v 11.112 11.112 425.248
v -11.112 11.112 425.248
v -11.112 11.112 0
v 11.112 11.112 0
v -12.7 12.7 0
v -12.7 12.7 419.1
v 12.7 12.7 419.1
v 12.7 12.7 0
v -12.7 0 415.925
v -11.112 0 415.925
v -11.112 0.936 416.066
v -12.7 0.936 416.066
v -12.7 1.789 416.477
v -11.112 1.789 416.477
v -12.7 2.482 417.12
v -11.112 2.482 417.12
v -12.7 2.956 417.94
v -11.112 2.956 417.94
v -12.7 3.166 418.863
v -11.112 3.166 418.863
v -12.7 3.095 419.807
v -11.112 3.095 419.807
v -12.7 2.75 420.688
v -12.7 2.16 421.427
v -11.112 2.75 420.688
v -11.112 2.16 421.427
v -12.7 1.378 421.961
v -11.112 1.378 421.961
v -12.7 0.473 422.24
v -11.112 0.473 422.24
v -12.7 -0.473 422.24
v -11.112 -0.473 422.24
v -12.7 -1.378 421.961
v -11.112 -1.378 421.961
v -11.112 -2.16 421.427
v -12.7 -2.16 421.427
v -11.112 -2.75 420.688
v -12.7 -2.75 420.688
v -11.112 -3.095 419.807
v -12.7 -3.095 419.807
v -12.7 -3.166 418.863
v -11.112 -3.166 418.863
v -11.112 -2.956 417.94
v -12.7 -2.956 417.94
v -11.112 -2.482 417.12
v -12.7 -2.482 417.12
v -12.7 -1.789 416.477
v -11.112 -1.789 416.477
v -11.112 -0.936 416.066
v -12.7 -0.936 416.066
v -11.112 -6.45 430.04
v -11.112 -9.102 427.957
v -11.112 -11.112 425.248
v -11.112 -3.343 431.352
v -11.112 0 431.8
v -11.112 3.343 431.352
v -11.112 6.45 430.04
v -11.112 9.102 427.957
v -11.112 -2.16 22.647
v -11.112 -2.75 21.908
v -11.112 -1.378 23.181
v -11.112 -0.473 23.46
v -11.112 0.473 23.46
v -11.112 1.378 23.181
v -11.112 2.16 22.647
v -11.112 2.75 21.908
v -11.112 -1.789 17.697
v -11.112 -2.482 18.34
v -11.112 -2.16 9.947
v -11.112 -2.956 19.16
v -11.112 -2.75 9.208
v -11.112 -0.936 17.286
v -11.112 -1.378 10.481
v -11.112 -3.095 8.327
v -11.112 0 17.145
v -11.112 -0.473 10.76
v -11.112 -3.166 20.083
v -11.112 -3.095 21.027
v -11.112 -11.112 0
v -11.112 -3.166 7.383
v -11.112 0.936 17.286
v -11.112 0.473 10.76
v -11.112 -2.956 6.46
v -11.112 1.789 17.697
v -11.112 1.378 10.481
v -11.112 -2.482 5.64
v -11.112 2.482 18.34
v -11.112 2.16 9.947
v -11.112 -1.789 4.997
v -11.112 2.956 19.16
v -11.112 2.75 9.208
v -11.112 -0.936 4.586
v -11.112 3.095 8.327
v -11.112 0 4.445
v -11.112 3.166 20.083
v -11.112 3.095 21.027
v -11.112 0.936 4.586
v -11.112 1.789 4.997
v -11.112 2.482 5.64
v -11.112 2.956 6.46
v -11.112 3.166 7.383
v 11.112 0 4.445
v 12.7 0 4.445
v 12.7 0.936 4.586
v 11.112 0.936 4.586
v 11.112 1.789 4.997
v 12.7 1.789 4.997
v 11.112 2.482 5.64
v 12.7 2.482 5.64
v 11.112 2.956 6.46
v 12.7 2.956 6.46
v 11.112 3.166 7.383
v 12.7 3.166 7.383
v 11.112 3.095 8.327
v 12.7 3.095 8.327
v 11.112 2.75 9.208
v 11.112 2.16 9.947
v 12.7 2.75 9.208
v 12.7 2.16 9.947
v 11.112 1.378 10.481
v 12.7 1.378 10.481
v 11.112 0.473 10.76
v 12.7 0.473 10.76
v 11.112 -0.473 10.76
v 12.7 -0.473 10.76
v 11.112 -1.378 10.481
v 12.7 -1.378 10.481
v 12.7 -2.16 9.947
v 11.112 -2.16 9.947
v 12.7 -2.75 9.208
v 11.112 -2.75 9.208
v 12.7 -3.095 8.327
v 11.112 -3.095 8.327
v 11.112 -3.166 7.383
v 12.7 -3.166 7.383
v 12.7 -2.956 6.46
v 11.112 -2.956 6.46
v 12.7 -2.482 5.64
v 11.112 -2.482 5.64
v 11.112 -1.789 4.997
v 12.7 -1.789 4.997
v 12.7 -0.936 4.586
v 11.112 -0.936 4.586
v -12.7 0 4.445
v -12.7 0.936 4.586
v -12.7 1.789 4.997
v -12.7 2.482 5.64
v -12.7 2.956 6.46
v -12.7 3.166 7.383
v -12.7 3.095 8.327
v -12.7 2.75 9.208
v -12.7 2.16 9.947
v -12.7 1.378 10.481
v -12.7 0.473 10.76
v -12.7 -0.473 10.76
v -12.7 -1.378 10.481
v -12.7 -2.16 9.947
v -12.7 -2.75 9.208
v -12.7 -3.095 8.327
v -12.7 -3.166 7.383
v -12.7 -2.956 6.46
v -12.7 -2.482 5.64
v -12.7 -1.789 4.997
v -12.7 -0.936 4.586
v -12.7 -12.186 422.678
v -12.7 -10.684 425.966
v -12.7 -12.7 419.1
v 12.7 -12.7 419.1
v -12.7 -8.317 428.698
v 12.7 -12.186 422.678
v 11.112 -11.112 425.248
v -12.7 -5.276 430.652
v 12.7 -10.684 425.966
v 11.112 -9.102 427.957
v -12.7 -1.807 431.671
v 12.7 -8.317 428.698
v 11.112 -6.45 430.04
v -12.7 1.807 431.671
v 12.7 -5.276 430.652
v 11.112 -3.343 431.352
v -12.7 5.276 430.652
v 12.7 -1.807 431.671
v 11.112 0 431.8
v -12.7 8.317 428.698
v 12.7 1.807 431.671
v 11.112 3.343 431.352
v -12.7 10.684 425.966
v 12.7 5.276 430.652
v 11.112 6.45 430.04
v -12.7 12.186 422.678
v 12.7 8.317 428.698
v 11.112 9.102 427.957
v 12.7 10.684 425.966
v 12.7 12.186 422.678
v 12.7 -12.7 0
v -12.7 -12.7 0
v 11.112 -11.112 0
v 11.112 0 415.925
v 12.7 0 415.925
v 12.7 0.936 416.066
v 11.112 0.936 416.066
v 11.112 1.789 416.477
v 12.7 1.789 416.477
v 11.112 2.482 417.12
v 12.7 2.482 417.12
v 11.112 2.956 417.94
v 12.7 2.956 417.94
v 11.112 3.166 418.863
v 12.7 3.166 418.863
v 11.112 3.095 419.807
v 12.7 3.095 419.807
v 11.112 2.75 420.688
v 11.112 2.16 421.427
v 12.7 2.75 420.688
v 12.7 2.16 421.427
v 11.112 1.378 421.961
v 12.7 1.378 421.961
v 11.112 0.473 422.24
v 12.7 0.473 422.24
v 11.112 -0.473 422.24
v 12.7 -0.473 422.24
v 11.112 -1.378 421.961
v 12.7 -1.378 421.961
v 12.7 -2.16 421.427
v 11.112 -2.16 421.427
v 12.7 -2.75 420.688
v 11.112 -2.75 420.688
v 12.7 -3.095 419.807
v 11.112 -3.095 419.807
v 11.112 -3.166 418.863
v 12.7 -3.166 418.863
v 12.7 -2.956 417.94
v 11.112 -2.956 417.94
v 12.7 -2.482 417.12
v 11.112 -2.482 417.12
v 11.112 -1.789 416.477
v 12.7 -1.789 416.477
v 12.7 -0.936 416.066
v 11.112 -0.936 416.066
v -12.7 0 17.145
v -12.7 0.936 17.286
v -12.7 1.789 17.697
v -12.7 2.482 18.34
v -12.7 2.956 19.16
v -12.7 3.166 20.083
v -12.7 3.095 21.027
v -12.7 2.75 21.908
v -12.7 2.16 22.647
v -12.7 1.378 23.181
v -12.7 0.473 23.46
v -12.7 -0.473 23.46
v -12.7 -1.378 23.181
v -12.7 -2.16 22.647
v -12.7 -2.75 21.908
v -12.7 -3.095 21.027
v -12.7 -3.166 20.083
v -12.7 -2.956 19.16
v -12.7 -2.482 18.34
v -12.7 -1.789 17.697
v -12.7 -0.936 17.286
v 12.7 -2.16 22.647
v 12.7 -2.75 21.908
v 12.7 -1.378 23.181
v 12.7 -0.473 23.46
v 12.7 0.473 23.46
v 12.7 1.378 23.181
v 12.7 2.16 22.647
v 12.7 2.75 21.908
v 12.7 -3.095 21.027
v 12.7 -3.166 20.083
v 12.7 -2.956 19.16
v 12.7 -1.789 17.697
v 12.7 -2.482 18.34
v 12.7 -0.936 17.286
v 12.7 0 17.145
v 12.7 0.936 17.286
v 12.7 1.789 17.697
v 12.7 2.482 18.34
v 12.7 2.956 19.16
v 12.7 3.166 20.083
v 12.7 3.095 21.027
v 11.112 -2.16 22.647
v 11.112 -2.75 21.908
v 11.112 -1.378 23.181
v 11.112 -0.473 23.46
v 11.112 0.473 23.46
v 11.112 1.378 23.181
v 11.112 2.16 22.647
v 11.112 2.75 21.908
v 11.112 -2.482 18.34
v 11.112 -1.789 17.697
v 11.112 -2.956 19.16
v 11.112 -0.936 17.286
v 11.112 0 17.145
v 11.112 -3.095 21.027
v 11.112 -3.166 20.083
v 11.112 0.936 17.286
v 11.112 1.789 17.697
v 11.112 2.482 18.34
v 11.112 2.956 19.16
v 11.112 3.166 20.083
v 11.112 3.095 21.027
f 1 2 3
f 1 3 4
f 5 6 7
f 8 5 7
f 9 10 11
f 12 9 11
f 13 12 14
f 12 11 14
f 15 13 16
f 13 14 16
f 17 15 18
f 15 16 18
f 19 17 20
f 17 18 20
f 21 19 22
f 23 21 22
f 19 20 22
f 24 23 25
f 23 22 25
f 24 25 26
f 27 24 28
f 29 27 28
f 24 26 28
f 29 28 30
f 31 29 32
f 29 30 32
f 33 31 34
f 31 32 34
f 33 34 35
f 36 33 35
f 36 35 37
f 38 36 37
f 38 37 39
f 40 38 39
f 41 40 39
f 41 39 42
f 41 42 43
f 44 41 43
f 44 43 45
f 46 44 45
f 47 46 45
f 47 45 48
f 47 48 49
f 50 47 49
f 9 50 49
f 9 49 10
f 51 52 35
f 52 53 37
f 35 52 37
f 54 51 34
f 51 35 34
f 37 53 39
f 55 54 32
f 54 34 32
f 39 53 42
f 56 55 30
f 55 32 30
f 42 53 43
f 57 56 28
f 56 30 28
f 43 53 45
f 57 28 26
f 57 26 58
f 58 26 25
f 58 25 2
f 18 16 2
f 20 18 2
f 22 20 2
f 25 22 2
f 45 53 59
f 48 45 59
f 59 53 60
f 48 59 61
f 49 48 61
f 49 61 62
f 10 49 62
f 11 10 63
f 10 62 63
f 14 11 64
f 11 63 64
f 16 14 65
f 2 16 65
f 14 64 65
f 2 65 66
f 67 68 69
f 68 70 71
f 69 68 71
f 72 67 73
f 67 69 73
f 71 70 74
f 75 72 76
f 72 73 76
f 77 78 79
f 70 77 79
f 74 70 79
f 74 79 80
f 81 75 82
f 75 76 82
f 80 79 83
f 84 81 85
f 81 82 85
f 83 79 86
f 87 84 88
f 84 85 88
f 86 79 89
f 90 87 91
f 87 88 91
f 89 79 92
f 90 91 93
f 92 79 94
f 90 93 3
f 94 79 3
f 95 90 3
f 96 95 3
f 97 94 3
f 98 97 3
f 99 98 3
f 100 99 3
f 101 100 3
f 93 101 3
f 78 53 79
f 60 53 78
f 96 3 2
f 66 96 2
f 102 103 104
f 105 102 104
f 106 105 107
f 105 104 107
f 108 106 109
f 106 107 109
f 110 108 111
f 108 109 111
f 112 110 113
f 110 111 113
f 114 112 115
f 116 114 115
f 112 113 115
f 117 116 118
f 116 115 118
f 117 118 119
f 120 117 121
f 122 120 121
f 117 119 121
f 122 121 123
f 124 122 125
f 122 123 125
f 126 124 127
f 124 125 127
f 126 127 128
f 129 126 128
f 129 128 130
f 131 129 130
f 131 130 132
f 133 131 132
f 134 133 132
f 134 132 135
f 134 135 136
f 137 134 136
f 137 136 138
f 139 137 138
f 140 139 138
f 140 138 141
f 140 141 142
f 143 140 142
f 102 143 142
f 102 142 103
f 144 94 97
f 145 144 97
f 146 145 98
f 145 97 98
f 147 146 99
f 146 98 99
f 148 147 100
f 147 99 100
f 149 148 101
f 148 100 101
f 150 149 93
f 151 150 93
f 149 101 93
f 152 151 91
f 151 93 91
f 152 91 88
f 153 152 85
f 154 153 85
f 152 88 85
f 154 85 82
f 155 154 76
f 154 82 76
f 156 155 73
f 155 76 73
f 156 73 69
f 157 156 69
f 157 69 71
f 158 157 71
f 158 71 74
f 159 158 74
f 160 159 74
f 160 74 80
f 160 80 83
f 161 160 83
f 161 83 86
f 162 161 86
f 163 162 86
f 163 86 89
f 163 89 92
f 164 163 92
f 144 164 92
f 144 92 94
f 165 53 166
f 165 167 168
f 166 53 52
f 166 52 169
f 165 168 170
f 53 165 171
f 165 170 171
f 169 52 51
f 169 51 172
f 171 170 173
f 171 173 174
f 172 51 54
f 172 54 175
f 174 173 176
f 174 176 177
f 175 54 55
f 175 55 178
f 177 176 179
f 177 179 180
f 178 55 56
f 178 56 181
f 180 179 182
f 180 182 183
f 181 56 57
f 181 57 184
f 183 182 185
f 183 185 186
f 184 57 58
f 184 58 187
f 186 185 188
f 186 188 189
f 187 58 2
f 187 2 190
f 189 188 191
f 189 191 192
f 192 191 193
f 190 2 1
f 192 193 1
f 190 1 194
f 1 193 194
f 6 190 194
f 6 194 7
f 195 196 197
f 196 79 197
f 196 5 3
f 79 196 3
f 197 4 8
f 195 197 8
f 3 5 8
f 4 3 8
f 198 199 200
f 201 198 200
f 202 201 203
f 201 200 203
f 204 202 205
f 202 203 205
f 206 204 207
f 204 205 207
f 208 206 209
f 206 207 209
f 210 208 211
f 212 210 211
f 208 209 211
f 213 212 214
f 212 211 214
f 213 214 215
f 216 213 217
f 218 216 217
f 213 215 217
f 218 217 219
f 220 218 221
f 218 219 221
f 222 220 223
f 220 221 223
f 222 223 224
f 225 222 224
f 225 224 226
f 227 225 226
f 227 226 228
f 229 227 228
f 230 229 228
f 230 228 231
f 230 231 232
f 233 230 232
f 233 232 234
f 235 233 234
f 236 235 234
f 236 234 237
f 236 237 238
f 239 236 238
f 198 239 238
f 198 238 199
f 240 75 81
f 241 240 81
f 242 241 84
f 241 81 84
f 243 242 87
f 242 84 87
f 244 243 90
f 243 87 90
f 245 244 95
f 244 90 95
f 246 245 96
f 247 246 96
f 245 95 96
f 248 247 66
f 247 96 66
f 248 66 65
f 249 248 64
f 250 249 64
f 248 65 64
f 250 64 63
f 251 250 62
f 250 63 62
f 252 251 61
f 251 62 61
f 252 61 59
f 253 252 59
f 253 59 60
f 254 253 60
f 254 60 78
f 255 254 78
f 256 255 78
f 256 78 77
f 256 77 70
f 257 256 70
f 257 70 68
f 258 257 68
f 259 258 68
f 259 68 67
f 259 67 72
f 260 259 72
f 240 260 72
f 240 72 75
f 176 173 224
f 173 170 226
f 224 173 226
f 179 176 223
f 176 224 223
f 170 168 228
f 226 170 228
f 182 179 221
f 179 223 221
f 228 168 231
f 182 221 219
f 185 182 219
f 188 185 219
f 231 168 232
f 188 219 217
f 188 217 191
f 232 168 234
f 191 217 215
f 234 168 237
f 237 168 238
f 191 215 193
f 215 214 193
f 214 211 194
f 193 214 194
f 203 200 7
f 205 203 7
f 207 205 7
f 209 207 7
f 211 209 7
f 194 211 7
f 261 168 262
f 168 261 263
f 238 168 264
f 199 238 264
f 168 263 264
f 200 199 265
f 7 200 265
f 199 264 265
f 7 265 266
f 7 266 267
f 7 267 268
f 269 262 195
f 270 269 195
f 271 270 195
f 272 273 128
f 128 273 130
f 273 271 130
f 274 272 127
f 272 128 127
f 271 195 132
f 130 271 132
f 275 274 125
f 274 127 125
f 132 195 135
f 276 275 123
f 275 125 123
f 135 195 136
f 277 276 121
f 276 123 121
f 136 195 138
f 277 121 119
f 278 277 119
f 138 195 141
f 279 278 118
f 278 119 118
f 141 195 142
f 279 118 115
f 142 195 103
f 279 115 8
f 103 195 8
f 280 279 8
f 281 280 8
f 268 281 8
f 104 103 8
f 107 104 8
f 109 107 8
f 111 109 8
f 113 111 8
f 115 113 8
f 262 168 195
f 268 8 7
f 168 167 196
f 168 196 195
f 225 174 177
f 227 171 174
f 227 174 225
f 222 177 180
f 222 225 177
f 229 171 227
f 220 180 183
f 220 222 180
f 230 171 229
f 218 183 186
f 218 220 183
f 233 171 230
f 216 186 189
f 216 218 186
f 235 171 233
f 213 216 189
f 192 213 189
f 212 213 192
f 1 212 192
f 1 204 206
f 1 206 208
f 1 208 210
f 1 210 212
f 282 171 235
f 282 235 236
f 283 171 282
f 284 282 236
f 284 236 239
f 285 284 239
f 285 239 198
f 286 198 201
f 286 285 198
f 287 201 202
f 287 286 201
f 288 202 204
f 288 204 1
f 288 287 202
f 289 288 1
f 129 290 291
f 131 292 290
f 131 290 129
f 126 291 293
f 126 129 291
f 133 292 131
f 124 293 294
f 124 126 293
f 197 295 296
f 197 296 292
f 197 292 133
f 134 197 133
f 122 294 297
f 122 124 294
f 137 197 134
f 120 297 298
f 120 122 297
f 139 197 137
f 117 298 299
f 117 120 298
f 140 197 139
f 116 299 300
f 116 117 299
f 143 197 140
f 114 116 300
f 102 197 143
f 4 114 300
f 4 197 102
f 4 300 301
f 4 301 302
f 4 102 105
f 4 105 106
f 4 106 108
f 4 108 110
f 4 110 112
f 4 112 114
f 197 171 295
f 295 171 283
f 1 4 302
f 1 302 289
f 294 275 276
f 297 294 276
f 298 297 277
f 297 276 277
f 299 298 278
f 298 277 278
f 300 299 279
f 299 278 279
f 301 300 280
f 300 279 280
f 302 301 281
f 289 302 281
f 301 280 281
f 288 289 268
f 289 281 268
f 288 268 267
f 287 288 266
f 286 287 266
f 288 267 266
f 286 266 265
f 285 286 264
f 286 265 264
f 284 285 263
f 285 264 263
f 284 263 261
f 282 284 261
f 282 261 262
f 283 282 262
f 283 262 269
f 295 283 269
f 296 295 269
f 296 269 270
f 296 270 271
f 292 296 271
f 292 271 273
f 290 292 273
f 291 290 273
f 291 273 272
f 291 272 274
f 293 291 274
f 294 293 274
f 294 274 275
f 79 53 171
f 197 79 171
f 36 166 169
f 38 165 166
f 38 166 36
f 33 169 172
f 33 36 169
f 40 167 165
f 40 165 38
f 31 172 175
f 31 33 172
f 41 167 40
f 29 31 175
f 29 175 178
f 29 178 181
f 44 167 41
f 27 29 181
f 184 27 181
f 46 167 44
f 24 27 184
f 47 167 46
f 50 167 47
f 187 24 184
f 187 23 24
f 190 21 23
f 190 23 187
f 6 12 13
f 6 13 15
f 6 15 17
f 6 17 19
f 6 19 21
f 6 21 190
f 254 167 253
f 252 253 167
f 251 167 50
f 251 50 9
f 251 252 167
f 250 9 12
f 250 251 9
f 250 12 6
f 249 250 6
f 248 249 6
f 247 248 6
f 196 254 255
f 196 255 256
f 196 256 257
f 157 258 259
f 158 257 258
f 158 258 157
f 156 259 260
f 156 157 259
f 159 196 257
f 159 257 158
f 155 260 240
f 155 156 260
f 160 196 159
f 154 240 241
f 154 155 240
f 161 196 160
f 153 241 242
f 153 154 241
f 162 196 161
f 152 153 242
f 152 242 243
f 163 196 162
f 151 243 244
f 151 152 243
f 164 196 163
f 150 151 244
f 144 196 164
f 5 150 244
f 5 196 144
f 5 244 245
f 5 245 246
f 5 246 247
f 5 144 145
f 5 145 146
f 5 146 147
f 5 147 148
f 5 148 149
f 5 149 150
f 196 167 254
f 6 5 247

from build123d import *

# Parameters (mm, degrees)
SKETCH1_W           = 25.4
SKETCH1_H           = 25.4
SKETCH1_W_2         = 22.225
SKETCH1_H_2         = 22.225
BOSS_EXTRUDE1_DEPTH = 431.8
SKETCH2_R           = 3.175
CUT_EXTRUDE1_DEPTH  = 26.4
CUT_EXTRUDE2_DEPTH  = 491.49


with BuildPart() as part:
    # Sketch1 → Boss-Extrude1 (new body)
    with BuildSketch(Plane.XY):
        Rectangle(SKETCH1_W, SKETCH1_H)
        Rectangle(SKETCH1_W_2, SKETCH1_H_2, mode=Mode.SUBTRACT)
    extrude(amount=BOSS_EXTRUDE1_DEPTH)

    # Sketch2 → Cut-Extrude1 (cut, through all)
    with BuildSketch(Plane(origin=(12.7, 0, 0), x_dir=(0, 0, -1), z_dir=(1, 0, 0))):
        with Locations((-419.1, 0)):
            Circle(SKETCH2_R)
        with Locations((-7.62, 0)):
            Circle(SKETCH2_R)
        with Locations((-20.32, 0)):
            Circle(SKETCH2_R)
    extrude(amount=-CUT_EXTRUDE1_DEPTH, mode=Mode.SUBTRACT)

    # Sketch4 → Cut-Extrude2 (cut)
    with BuildSketch(Plane(origin=(12.7, 0, 0), x_dir=(0, 0, -1), z_dir=(1, 0, 0))):
        with BuildLine():
            Line((-419.1, 12.7), (-431.8, 12.7))
            Line((-431.8, 12.7), (-491.49, -12.7))
            Line((-491.49, -12.7), (-419.1, -12.7))
            ThreePointArc((-419.1, -12.7), (-431.8, 0), (-419.1, 12.7))
        make_face()
    extrude(amount=-CUT_EXTRUDE2_DEPTH, mode=Mode.SUBTRACT)


solid = part.part
